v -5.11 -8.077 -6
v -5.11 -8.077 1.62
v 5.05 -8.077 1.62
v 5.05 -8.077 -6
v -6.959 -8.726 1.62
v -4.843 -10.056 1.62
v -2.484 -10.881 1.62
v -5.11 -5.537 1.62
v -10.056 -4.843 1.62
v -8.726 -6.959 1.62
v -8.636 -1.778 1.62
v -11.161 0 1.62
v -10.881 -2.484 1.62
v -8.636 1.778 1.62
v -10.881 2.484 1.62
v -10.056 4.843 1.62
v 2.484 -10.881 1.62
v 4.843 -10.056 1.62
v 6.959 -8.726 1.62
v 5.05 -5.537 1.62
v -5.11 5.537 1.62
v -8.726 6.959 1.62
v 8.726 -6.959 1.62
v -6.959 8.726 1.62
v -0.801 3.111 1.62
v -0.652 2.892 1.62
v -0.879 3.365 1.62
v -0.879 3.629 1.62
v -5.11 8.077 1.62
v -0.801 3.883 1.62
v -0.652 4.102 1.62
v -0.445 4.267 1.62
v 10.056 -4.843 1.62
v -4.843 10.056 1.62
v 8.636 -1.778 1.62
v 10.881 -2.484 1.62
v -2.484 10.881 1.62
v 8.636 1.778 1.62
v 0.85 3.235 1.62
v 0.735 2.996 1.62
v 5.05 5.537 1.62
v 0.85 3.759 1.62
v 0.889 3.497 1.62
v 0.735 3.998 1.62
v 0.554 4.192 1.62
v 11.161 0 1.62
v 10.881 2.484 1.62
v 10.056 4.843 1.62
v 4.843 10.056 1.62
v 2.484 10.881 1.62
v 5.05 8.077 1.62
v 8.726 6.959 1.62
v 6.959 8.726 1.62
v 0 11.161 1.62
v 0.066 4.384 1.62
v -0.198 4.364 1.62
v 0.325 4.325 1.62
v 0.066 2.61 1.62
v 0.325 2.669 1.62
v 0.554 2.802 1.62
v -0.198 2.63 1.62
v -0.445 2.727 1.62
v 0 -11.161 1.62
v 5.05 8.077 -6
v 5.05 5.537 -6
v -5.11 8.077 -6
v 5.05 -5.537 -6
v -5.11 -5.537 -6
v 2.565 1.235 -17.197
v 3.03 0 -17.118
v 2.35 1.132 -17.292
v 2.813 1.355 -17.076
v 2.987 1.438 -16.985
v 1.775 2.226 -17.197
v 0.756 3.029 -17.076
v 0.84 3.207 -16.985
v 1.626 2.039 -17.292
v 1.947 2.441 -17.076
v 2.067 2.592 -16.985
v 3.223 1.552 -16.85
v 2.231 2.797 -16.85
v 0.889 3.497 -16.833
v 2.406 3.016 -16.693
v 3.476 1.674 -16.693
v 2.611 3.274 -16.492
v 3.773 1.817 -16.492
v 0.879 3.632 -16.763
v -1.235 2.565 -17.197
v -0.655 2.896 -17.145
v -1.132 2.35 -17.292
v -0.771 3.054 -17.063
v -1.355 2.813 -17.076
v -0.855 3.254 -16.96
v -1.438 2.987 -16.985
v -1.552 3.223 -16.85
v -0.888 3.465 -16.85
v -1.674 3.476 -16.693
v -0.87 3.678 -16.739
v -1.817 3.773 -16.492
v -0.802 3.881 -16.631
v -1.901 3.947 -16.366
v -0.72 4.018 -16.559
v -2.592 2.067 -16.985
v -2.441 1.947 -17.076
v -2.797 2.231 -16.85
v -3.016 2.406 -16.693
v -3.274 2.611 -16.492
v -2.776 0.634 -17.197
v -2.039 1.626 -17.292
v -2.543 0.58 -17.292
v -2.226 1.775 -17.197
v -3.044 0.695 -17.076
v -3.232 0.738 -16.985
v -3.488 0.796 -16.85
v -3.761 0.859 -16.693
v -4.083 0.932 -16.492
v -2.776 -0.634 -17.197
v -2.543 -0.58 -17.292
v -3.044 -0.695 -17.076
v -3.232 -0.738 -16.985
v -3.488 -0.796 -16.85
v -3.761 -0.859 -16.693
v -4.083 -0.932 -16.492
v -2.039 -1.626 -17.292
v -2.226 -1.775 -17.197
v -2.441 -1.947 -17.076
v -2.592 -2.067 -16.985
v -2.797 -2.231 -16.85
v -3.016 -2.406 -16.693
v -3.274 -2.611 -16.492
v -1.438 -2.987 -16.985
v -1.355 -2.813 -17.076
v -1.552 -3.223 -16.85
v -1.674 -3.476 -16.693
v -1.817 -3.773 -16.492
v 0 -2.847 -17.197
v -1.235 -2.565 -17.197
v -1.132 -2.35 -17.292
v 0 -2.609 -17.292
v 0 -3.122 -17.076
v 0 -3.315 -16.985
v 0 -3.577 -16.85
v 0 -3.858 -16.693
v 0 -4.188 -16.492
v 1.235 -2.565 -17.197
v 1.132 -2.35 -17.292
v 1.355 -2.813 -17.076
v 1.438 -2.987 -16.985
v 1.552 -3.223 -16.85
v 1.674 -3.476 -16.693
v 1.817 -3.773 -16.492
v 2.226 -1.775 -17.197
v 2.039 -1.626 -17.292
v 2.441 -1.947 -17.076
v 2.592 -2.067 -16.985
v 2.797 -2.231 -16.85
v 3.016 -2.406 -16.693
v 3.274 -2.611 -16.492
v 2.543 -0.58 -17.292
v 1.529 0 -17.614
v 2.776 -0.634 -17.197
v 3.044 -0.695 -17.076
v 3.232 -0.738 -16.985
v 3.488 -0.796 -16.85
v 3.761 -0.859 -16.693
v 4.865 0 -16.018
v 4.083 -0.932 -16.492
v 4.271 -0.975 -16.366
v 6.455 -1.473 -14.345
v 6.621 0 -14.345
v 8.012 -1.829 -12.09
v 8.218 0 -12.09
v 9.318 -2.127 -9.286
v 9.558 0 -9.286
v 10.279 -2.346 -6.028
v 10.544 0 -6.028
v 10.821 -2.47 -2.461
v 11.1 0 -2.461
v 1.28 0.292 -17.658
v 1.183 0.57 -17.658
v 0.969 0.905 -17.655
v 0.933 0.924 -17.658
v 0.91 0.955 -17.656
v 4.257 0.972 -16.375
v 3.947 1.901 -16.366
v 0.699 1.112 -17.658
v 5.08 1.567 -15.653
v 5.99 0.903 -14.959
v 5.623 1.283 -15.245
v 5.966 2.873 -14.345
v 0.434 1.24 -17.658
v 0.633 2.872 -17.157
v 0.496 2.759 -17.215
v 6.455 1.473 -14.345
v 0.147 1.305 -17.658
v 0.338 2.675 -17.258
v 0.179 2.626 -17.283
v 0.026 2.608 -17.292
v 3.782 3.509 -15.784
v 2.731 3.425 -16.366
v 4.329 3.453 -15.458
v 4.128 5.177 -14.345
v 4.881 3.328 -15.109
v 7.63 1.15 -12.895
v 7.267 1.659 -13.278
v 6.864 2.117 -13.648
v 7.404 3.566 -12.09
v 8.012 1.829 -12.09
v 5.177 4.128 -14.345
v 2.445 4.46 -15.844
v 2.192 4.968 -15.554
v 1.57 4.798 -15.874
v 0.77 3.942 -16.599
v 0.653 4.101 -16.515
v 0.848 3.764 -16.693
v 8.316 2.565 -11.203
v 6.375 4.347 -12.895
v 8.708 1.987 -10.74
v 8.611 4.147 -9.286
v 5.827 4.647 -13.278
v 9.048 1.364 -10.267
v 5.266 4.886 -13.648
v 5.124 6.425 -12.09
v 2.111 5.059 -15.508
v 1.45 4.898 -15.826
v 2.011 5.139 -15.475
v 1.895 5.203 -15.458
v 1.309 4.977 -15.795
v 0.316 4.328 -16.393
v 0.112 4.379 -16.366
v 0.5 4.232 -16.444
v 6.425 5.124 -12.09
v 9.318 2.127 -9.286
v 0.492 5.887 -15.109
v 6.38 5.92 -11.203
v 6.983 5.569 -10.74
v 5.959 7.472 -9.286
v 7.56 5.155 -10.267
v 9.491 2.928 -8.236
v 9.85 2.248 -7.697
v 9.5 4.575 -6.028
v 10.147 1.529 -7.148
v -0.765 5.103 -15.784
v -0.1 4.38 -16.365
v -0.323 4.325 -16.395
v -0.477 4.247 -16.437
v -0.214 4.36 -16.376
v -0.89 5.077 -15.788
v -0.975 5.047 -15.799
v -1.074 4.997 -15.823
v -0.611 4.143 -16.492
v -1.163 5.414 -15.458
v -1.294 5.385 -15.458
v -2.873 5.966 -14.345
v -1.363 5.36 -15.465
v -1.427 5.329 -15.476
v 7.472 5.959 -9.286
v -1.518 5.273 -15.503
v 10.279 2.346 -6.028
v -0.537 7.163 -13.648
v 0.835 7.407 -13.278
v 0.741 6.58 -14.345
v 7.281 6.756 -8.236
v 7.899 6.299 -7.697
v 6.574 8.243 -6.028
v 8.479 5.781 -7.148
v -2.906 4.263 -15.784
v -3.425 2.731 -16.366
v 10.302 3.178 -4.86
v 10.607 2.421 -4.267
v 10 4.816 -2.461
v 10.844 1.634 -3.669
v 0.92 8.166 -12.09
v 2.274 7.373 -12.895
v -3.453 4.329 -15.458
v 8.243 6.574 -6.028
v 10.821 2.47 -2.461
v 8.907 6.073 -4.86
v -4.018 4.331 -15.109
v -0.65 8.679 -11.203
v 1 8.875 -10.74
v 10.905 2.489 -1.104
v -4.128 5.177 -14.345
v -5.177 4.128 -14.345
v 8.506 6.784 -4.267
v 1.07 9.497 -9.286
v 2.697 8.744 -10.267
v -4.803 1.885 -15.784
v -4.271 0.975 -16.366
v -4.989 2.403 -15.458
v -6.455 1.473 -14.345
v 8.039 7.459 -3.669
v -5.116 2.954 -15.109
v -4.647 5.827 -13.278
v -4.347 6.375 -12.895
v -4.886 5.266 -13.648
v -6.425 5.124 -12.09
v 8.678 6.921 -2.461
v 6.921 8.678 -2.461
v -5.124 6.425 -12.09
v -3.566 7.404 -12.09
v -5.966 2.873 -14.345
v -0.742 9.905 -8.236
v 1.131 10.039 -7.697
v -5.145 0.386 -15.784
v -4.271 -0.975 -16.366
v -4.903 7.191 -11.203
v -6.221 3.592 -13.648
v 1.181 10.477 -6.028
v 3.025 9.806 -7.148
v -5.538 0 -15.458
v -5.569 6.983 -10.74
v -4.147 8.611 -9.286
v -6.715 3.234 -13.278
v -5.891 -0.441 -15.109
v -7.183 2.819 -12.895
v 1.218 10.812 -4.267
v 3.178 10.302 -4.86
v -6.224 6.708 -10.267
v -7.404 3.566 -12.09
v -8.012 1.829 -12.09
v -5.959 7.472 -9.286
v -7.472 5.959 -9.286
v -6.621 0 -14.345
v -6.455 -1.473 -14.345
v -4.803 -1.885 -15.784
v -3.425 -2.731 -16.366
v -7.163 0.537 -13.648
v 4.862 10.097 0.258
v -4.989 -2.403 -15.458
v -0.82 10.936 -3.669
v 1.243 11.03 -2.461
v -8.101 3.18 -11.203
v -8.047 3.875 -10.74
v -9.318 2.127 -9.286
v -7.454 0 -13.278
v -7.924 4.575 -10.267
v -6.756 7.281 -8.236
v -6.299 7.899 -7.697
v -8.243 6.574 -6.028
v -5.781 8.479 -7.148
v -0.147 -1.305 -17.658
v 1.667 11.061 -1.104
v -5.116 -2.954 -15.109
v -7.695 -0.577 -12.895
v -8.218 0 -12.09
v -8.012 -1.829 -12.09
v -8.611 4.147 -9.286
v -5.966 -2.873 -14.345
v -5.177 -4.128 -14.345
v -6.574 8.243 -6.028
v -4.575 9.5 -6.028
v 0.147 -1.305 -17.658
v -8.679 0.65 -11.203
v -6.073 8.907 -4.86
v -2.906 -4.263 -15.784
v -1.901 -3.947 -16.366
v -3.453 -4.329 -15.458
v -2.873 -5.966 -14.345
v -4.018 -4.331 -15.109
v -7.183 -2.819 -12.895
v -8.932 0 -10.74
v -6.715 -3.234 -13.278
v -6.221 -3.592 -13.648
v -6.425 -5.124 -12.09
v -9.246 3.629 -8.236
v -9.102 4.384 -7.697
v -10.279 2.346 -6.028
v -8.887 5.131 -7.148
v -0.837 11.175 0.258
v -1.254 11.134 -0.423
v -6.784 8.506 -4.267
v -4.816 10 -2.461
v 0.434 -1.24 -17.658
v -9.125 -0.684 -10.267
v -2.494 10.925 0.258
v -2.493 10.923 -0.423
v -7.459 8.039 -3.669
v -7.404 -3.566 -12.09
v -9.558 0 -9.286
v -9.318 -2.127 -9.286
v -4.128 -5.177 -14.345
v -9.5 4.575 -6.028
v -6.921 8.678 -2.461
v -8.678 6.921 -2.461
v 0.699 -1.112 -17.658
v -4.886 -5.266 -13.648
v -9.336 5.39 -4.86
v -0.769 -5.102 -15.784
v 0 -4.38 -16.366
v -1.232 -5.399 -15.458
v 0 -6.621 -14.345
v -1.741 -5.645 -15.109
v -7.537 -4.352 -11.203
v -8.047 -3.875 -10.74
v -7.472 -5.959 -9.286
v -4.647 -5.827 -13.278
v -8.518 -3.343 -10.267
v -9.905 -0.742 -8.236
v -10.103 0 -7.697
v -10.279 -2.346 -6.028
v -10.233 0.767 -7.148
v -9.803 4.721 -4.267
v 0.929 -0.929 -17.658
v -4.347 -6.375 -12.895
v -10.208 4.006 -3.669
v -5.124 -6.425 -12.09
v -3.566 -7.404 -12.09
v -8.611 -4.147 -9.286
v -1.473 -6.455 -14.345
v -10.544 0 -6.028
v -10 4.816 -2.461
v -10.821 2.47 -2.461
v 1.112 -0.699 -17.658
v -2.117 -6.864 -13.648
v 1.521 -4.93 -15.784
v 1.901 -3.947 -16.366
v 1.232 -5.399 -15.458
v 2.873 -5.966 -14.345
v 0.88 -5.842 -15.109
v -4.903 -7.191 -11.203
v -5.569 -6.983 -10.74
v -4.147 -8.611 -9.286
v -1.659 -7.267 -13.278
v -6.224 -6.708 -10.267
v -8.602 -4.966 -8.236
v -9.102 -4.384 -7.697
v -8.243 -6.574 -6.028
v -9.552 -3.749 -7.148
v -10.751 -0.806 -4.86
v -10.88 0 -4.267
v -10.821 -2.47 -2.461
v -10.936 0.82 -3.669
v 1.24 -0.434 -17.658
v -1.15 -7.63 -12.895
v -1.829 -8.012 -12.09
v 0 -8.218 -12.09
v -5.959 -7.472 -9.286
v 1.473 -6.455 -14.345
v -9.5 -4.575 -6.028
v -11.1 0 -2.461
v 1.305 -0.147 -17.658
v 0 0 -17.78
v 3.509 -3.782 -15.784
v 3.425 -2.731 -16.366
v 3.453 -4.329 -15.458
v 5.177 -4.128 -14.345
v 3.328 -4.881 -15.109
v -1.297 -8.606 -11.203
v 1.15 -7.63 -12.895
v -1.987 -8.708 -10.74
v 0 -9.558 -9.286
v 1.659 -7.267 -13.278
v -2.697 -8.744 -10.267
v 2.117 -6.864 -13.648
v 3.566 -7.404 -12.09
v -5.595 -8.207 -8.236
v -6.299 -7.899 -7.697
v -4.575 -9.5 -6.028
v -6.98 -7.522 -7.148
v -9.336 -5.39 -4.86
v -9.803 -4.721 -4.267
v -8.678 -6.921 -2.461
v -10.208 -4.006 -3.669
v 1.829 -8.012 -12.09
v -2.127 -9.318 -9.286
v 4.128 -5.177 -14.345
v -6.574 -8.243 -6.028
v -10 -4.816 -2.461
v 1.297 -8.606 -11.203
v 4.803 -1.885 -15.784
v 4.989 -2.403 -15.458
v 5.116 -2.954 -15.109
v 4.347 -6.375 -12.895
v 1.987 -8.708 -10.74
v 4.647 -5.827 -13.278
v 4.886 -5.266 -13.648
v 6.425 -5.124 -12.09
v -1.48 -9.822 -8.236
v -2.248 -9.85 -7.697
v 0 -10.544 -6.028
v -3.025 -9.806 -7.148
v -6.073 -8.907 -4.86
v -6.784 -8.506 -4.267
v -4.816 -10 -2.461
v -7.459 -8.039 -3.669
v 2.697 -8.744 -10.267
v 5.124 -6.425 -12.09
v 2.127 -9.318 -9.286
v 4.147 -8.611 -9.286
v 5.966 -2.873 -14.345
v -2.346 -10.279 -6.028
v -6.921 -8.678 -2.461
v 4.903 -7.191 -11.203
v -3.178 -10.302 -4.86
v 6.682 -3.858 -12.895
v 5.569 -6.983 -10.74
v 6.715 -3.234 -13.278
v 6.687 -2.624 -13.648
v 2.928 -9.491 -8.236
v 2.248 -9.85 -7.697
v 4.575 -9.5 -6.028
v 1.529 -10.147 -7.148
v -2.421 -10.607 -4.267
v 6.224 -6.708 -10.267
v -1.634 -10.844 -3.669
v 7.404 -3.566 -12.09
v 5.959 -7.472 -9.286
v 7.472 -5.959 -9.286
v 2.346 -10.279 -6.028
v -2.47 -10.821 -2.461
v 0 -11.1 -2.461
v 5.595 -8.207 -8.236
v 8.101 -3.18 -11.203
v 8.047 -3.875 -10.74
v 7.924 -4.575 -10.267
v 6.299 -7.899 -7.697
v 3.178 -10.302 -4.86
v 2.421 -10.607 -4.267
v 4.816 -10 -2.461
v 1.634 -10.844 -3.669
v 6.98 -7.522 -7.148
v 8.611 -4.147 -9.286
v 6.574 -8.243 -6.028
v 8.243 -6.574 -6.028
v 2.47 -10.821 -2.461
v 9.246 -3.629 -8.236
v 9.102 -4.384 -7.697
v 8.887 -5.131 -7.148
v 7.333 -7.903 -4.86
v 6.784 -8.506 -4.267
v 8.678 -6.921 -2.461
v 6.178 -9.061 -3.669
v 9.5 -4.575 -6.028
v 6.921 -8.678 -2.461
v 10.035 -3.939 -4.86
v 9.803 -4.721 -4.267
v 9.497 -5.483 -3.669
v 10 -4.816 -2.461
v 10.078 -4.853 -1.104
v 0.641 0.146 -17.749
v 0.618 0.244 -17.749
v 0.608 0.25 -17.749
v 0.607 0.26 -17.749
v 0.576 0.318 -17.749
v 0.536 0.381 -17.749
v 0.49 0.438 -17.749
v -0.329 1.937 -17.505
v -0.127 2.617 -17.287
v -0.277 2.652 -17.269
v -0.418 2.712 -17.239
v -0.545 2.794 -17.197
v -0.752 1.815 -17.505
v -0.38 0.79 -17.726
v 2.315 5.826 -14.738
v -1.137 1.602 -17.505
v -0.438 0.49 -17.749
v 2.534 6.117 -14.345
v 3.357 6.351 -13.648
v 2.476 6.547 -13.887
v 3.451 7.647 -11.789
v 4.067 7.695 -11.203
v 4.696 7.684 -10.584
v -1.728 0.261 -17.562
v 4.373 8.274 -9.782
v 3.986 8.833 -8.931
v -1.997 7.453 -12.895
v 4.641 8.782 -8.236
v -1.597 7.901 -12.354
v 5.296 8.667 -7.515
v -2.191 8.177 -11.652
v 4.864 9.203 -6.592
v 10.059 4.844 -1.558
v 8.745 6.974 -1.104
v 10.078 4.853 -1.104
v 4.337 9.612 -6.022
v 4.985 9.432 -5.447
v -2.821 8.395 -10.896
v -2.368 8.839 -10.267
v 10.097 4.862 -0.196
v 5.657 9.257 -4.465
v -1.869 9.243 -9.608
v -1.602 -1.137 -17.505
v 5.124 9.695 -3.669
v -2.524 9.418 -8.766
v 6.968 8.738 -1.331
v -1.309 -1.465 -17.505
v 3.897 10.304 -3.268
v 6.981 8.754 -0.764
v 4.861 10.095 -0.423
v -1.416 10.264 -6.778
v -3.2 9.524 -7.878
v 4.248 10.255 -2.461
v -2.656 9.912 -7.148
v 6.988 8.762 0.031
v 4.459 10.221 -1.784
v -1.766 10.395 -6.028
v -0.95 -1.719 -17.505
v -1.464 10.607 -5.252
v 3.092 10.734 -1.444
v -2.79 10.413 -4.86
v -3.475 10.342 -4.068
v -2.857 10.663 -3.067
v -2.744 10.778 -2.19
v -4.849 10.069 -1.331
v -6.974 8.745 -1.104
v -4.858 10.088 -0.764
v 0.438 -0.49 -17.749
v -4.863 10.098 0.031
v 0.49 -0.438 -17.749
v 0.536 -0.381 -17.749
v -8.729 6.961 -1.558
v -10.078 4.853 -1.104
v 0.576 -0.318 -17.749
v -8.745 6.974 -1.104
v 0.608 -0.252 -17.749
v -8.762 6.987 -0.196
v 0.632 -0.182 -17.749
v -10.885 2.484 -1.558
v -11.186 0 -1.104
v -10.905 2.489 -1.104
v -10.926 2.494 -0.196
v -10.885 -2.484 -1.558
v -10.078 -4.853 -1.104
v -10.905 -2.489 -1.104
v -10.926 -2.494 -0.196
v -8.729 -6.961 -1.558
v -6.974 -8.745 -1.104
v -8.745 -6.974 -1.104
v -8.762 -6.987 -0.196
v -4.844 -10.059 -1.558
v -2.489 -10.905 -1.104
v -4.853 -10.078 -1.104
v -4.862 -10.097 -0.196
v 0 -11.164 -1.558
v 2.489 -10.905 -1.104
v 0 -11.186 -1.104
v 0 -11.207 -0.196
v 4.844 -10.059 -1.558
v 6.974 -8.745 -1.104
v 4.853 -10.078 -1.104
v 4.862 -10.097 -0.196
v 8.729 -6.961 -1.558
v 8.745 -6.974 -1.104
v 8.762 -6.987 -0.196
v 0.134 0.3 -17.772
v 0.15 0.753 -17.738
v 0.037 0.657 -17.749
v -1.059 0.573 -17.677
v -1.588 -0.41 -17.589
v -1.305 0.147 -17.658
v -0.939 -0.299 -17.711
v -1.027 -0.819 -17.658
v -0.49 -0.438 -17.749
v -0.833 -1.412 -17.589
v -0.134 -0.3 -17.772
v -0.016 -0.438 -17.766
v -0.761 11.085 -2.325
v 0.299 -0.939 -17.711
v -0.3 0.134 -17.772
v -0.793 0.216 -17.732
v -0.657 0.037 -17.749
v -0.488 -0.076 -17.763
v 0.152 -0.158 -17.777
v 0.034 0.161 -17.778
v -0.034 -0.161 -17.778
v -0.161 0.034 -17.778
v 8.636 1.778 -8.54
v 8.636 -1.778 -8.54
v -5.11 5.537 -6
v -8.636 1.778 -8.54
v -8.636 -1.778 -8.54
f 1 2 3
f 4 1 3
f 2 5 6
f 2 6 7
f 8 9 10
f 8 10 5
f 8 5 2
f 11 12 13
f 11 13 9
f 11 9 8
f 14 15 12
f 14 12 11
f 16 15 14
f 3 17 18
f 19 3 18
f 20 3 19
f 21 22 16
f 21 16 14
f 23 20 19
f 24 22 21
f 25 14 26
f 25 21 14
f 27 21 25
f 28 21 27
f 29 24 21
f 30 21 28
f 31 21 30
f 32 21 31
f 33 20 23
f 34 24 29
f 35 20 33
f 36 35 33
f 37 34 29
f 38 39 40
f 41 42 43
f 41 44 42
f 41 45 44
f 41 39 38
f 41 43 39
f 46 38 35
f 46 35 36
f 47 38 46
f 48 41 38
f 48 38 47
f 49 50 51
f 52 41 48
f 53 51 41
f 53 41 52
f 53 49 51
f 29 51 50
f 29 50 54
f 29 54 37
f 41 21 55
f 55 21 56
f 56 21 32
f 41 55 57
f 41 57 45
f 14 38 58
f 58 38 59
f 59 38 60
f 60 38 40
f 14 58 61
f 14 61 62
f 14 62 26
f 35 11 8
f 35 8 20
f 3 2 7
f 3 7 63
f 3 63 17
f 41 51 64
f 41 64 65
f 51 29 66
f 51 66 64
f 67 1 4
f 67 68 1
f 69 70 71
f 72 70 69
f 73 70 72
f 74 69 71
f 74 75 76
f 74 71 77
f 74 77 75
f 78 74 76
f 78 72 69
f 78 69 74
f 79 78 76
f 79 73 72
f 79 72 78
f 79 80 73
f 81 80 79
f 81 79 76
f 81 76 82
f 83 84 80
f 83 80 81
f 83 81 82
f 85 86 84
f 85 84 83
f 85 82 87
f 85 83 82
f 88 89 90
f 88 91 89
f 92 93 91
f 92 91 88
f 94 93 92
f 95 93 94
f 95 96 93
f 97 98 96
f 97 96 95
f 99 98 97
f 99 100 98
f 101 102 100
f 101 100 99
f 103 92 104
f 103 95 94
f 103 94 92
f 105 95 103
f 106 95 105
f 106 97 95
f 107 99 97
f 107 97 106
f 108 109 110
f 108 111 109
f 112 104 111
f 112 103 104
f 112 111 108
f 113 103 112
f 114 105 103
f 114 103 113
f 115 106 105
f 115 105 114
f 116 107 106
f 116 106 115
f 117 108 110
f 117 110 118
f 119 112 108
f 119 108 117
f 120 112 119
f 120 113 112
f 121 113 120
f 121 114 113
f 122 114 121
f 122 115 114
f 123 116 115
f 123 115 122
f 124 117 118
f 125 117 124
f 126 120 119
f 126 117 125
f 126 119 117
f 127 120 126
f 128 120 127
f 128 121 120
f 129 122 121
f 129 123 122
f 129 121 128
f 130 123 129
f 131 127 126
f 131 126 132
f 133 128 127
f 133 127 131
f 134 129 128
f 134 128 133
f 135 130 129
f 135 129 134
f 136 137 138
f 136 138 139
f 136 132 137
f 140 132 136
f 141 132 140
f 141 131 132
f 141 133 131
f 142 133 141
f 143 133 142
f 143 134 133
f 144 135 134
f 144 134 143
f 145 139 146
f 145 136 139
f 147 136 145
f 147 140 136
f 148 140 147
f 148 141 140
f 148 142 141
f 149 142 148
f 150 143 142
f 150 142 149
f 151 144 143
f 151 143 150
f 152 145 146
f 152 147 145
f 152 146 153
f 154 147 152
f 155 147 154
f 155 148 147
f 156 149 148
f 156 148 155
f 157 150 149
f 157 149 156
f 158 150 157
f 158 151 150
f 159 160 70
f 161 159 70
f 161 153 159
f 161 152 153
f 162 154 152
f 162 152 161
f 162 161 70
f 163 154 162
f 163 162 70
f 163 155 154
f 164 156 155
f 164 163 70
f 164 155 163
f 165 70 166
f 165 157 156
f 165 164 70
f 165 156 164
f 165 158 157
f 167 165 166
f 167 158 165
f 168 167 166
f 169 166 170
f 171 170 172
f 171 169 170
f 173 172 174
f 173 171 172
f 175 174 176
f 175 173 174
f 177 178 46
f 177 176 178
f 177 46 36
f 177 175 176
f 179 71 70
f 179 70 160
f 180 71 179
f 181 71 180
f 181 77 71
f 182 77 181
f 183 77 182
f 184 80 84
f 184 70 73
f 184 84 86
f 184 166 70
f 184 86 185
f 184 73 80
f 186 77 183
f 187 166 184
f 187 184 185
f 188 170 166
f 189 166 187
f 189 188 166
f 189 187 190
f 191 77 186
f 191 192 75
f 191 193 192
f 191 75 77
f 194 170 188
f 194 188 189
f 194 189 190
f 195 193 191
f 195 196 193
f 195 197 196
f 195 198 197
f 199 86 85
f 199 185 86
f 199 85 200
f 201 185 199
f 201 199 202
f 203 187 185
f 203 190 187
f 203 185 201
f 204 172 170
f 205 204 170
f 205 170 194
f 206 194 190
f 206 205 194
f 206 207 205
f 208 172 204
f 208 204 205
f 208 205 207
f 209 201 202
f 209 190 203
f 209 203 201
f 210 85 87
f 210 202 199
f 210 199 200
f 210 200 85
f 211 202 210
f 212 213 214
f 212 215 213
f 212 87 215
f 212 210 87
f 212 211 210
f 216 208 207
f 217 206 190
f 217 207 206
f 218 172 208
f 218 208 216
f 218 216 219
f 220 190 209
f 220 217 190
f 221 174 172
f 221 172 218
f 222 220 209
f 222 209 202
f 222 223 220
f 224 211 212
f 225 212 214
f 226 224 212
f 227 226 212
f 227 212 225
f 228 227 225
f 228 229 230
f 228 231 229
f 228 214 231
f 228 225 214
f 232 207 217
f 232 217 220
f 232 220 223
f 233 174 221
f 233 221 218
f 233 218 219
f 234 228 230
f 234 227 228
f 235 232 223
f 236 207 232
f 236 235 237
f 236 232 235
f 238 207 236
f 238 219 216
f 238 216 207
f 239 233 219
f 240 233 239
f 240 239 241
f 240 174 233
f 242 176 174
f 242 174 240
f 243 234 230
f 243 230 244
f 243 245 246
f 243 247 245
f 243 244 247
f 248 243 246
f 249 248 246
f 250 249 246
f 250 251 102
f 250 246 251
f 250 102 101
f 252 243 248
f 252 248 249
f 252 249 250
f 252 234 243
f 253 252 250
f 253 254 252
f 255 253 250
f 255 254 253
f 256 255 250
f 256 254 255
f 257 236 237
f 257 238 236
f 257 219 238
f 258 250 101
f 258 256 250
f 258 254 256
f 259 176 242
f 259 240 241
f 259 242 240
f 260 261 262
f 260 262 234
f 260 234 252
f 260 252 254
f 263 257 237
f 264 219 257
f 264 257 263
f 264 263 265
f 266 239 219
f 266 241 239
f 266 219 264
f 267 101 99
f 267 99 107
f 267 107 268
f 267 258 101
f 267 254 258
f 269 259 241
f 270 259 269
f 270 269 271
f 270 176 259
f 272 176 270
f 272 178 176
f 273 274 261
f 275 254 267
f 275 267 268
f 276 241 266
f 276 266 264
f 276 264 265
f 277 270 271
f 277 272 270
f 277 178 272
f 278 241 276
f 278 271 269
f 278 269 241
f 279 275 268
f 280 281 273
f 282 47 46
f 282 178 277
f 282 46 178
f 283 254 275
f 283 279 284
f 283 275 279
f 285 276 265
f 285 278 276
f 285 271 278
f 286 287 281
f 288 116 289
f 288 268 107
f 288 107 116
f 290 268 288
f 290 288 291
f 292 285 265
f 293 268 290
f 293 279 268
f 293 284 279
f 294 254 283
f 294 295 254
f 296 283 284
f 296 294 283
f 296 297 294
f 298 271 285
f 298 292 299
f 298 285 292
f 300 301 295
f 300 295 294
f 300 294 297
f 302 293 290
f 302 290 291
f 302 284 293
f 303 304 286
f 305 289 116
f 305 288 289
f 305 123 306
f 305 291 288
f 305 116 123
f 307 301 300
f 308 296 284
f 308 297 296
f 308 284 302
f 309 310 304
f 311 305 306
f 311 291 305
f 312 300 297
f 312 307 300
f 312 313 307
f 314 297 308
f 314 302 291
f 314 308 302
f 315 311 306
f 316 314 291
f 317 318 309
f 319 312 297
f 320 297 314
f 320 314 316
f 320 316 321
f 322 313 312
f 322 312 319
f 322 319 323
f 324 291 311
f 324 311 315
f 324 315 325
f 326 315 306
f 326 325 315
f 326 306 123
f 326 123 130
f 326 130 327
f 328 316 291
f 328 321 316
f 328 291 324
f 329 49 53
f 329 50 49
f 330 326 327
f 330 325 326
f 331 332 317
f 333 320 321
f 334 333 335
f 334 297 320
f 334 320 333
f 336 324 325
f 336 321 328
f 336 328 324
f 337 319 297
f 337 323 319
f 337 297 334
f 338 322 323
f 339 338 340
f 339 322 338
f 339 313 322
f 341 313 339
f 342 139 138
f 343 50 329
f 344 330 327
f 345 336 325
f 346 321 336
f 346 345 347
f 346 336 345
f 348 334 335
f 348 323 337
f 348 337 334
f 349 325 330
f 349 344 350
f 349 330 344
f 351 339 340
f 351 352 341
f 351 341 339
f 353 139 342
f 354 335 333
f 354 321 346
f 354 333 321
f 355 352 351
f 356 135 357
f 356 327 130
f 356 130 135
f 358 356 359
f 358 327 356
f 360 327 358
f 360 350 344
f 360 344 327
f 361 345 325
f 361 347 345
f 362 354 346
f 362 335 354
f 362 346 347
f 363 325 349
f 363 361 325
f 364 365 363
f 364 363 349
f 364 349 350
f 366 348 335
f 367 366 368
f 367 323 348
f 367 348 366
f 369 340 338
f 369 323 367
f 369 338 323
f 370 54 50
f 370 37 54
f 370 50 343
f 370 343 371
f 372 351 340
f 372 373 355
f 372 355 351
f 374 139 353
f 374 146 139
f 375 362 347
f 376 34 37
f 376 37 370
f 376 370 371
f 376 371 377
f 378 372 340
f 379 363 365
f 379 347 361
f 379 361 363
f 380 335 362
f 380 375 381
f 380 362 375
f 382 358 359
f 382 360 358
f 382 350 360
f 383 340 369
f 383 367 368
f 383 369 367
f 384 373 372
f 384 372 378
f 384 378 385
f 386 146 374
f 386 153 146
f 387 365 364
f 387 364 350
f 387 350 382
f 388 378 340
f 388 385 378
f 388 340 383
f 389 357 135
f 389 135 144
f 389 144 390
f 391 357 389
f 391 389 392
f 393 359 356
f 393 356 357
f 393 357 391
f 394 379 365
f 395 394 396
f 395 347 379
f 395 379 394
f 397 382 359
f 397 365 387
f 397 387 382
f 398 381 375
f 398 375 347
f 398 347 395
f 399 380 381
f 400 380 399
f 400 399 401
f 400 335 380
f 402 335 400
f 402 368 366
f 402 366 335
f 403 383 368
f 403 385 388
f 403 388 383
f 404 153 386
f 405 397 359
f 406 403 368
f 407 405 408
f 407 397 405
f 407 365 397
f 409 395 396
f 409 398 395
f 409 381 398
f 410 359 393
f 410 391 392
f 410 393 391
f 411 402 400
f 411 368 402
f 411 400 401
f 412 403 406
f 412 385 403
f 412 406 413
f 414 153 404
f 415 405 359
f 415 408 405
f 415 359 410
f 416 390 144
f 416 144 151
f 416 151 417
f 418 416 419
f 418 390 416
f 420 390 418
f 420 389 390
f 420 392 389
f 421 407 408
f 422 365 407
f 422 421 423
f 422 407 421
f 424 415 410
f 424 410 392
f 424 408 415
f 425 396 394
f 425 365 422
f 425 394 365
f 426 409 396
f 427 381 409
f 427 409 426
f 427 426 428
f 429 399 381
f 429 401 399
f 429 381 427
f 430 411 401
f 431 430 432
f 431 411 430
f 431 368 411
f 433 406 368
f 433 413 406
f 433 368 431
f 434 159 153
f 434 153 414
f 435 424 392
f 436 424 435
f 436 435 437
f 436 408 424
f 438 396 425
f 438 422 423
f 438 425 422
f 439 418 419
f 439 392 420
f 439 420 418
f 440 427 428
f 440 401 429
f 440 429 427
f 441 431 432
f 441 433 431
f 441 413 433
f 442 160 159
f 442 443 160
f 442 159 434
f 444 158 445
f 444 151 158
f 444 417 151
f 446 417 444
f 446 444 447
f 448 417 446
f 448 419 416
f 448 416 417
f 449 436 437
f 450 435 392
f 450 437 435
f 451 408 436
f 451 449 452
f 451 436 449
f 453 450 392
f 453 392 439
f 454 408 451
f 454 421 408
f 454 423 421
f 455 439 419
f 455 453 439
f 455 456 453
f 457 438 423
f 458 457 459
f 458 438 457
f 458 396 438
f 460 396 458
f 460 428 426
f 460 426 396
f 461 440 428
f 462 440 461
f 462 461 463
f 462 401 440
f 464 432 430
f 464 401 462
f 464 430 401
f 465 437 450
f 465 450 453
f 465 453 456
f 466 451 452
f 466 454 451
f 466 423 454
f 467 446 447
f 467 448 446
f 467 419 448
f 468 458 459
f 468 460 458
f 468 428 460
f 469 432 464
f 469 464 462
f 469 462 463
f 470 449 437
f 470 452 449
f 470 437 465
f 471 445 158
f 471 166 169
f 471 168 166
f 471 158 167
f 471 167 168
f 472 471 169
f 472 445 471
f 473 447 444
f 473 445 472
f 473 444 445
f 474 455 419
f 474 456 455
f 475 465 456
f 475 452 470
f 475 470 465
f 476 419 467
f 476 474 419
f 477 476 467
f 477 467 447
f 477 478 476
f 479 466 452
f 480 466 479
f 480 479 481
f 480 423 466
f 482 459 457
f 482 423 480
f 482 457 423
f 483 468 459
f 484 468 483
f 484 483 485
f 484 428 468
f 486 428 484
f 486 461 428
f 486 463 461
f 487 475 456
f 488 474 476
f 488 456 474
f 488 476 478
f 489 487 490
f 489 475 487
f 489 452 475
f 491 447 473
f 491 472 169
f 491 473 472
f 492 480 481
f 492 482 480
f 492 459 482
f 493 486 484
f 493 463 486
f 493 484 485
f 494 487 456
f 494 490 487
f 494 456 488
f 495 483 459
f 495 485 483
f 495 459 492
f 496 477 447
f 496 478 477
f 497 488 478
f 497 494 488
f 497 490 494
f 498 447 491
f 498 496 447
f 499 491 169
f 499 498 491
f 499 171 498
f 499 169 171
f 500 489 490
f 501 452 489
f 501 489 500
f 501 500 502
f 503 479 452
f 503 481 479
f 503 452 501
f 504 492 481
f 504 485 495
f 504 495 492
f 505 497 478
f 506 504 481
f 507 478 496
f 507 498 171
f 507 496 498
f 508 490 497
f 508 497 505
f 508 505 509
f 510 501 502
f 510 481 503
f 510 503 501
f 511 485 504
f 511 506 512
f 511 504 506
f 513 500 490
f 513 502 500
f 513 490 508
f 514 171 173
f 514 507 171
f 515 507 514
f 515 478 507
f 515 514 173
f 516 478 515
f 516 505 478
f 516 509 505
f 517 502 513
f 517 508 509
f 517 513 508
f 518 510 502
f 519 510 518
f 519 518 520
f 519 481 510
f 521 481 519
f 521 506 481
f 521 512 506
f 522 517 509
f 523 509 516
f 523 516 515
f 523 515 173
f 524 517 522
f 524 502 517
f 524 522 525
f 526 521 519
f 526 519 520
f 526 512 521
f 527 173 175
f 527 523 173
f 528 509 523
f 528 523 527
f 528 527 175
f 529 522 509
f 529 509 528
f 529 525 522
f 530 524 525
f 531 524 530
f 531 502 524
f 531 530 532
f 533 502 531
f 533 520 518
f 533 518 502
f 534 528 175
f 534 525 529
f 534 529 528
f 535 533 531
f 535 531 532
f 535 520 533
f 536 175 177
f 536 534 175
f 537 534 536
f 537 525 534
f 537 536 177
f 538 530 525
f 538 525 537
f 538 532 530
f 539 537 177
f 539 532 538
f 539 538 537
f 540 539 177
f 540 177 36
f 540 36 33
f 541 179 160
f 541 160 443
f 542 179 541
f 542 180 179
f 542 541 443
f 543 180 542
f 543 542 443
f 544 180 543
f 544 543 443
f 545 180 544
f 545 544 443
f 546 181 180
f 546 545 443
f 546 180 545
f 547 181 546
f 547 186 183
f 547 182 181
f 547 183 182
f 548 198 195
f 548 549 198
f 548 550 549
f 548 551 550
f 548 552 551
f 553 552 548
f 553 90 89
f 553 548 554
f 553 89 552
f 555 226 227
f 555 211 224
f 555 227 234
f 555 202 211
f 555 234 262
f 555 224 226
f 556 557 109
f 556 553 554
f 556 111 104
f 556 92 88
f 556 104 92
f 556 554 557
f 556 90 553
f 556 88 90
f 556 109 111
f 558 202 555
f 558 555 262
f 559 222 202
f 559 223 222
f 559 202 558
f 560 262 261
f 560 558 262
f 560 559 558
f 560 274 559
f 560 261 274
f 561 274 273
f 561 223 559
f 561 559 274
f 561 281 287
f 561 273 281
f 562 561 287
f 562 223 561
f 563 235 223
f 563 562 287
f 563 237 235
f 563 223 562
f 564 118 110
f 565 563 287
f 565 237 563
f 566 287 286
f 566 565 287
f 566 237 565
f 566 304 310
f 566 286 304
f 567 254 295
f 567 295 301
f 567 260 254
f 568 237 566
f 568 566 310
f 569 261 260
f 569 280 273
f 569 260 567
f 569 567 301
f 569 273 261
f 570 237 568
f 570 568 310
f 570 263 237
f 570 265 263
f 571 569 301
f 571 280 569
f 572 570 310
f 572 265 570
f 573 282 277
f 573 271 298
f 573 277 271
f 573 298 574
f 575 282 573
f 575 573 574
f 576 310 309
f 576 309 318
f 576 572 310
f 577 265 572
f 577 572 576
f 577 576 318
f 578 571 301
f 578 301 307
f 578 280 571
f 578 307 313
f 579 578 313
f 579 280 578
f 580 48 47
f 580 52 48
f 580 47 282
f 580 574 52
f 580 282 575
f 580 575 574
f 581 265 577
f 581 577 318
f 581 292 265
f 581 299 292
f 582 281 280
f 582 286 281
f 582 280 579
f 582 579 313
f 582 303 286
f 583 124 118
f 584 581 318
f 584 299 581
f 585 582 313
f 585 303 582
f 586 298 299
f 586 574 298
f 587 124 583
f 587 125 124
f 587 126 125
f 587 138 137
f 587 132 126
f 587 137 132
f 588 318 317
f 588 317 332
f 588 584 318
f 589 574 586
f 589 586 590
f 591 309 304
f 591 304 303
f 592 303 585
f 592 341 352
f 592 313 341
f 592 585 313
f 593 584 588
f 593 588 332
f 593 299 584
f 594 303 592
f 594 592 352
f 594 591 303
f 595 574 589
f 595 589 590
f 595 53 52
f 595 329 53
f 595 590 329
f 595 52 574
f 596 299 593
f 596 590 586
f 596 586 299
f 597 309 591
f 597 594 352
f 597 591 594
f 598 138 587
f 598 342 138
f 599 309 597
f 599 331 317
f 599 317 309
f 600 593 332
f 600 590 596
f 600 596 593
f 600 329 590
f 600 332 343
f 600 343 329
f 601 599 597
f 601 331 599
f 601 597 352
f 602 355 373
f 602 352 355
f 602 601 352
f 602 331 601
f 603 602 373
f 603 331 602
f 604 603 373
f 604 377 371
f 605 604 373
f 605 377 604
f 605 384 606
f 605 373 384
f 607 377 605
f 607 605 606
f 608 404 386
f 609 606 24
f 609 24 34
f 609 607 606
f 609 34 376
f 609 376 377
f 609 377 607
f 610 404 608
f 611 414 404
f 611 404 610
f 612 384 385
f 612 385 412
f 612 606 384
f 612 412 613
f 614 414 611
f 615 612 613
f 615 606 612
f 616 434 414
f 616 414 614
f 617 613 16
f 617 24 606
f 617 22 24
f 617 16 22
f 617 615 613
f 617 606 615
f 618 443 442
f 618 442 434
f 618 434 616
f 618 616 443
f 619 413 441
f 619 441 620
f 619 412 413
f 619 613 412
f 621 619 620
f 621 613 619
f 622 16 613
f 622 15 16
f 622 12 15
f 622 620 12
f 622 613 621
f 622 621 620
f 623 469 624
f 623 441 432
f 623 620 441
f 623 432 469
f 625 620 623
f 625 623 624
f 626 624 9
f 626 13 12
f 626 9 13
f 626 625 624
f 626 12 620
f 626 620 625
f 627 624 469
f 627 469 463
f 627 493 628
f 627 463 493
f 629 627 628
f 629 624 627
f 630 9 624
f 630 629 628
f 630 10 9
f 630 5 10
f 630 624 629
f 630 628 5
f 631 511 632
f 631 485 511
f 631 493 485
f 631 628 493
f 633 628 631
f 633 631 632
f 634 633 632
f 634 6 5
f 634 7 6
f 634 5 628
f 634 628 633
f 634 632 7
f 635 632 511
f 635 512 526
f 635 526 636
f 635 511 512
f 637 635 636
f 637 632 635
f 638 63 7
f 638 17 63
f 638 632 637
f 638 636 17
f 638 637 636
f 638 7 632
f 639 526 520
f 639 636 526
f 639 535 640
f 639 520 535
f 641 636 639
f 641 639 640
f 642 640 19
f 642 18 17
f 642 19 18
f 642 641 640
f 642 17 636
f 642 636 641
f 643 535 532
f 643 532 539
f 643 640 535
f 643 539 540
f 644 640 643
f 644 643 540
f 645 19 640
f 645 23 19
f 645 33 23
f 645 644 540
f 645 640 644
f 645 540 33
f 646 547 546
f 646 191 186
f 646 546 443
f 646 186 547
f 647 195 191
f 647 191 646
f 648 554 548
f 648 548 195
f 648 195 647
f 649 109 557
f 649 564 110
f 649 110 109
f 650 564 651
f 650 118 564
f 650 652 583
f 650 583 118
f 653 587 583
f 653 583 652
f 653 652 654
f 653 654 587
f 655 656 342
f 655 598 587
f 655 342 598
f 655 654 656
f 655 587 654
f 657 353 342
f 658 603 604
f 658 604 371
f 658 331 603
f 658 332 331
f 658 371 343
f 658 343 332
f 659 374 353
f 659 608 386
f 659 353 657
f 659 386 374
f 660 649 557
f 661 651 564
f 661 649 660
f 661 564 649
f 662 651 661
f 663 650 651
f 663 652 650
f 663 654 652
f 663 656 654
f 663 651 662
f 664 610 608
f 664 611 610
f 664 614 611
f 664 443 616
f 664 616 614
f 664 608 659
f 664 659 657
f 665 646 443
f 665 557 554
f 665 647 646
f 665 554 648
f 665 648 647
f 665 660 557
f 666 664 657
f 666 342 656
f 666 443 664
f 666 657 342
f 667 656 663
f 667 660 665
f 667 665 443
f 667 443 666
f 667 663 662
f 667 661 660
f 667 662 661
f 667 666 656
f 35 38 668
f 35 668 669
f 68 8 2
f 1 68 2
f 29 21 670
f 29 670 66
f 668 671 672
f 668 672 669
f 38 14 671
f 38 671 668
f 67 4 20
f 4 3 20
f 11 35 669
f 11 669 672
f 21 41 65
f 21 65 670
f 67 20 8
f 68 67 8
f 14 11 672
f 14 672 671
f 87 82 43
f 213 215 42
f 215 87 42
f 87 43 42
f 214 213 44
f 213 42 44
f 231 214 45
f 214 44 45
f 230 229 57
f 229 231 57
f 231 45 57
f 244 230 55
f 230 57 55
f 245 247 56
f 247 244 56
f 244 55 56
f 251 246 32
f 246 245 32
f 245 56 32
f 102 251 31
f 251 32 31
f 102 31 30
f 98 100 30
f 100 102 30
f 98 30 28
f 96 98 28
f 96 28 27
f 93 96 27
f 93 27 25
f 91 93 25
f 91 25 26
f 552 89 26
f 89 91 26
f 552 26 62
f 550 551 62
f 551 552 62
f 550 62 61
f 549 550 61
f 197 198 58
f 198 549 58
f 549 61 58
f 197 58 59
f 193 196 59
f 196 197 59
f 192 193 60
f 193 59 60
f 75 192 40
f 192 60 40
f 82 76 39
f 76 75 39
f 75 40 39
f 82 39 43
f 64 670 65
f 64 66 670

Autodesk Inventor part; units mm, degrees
ref_plane "YZ Plane" through (0, 0, 0) normal (1, 0, 0) x (0, 1, 0)
ref_plane "XZ Plane" through (0, 0, 0) normal (0, 1, 0) x (-1, 0, 0)
ref_plane "XY Plane" through (0, 0, 0) normal (0, 0, 1) x (1, 0, 0)
sketch "Sketch1" plane through (0, 0, 0) normal (0, 1, 0) x (-1, 0, 0)
  ellipse E0 centre (0, 0) end of major axis (0, 17.78) minor radius 11.2075
  line L0 (11.1609, 1.6196) -> (-11.1609, 1.6196)
  line L1 (0, -17.78) -> (0, 1.6196)
  line L2 (8.595, 11.4106) -> (-8.6719, 11.4106)
  dimension "d0" = 17.78
  dimension "d11" = 9.7909
revolve "Revolution1" add sketch "Sketch1" angle 360 about axis through (0, 0, -17.78) along (0, 0, 1) picked at (-2.3015, -10.0552) contours L0 L1 E0
sketch "Sketch2" plane through (0, 0, 1.6196) normal (0, 0, 1) x (1, 0, 0)
  line L0 (-8.636, 1.778) -> (8.636, 1.778)
  line L1 (8.636, 1.778) -> (8.636, -1.778)
  line L2 (8.636, -1.778) -> (-8.636, -1.778)
  line L3 (-8.636, -1.778) -> (-8.636, 1.778)
  line L4 (-8.636, 1.778) -> (8.636, -1.778) construction
  line L5 (8.636, 1.778) -> (-8.636, -1.778) construction
  point P0 (0, 0)
  dimension "d2" = 17.272
  dimension "d3" = 3.556
extrude "Extrusion1" cut sketch "Sketch2" against normal blind 10.16
sketch "Sketch3" plane through (0, 0, 1.6196) normal (0, 0, 1) x (1, 0, 0)
  line L0 (-5.11, 8.0772) -> (5.05, 8.0772)
  line L1 (5.05, 8.0772) -> (5.05, 5.5372)
  line L2 (5.05, 5.5372) -> (-5.11, 5.5372)
  line L3 (-5.11, 5.5372) -> (-5.11, 8.0772)
  line L4 (-5.11, 8.0772) -> (5.05, 5.5372) construction
  line L5 (5.05, 8.0772) -> (-5.11, 5.5372) construction
  circle A0 centre (0, 0) radius 11.1609 projected
  line L6 (-11.1609, 0) -> (11.1609, 0)
  line L7 (11.2075, 0) -> (0, 0) projected
  line L8 (-5.11, -8.0772) -> (5.05, -8.0772)
  line L9 (5.05, -8.0772) -> (5.05, -5.5372)
  line L10 (5.05, -5.5372) -> (-5.11, -5.5372)
  line L11 (-5.11, -5.5372) -> (-5.11, -8.0772)
  point P0 (-0.03, 6.8072)
  dimension "d6" = 10.16
  dimension "d7" = 2.54
  dimension "d12" = 6.8072
extrude "Extrusion2" cut sketch "Sketch3" against normal blind 7.62 contours L0 L1 L2 L3 | L11 L10 L9 L8
sketch "Sketch4" plane through (0, 0, 1.6196) normal (0, 0, 1) x (1, 0, 0)
  circle A0 centre (0, 3.497) radius 0.889
  point P0 (0, 0)
  dimension "d13" = 1.778
extrude "Extrusion3" cut sketch "Sketch4" against normal through all
properties part number "Bead Round Top copy 1"
